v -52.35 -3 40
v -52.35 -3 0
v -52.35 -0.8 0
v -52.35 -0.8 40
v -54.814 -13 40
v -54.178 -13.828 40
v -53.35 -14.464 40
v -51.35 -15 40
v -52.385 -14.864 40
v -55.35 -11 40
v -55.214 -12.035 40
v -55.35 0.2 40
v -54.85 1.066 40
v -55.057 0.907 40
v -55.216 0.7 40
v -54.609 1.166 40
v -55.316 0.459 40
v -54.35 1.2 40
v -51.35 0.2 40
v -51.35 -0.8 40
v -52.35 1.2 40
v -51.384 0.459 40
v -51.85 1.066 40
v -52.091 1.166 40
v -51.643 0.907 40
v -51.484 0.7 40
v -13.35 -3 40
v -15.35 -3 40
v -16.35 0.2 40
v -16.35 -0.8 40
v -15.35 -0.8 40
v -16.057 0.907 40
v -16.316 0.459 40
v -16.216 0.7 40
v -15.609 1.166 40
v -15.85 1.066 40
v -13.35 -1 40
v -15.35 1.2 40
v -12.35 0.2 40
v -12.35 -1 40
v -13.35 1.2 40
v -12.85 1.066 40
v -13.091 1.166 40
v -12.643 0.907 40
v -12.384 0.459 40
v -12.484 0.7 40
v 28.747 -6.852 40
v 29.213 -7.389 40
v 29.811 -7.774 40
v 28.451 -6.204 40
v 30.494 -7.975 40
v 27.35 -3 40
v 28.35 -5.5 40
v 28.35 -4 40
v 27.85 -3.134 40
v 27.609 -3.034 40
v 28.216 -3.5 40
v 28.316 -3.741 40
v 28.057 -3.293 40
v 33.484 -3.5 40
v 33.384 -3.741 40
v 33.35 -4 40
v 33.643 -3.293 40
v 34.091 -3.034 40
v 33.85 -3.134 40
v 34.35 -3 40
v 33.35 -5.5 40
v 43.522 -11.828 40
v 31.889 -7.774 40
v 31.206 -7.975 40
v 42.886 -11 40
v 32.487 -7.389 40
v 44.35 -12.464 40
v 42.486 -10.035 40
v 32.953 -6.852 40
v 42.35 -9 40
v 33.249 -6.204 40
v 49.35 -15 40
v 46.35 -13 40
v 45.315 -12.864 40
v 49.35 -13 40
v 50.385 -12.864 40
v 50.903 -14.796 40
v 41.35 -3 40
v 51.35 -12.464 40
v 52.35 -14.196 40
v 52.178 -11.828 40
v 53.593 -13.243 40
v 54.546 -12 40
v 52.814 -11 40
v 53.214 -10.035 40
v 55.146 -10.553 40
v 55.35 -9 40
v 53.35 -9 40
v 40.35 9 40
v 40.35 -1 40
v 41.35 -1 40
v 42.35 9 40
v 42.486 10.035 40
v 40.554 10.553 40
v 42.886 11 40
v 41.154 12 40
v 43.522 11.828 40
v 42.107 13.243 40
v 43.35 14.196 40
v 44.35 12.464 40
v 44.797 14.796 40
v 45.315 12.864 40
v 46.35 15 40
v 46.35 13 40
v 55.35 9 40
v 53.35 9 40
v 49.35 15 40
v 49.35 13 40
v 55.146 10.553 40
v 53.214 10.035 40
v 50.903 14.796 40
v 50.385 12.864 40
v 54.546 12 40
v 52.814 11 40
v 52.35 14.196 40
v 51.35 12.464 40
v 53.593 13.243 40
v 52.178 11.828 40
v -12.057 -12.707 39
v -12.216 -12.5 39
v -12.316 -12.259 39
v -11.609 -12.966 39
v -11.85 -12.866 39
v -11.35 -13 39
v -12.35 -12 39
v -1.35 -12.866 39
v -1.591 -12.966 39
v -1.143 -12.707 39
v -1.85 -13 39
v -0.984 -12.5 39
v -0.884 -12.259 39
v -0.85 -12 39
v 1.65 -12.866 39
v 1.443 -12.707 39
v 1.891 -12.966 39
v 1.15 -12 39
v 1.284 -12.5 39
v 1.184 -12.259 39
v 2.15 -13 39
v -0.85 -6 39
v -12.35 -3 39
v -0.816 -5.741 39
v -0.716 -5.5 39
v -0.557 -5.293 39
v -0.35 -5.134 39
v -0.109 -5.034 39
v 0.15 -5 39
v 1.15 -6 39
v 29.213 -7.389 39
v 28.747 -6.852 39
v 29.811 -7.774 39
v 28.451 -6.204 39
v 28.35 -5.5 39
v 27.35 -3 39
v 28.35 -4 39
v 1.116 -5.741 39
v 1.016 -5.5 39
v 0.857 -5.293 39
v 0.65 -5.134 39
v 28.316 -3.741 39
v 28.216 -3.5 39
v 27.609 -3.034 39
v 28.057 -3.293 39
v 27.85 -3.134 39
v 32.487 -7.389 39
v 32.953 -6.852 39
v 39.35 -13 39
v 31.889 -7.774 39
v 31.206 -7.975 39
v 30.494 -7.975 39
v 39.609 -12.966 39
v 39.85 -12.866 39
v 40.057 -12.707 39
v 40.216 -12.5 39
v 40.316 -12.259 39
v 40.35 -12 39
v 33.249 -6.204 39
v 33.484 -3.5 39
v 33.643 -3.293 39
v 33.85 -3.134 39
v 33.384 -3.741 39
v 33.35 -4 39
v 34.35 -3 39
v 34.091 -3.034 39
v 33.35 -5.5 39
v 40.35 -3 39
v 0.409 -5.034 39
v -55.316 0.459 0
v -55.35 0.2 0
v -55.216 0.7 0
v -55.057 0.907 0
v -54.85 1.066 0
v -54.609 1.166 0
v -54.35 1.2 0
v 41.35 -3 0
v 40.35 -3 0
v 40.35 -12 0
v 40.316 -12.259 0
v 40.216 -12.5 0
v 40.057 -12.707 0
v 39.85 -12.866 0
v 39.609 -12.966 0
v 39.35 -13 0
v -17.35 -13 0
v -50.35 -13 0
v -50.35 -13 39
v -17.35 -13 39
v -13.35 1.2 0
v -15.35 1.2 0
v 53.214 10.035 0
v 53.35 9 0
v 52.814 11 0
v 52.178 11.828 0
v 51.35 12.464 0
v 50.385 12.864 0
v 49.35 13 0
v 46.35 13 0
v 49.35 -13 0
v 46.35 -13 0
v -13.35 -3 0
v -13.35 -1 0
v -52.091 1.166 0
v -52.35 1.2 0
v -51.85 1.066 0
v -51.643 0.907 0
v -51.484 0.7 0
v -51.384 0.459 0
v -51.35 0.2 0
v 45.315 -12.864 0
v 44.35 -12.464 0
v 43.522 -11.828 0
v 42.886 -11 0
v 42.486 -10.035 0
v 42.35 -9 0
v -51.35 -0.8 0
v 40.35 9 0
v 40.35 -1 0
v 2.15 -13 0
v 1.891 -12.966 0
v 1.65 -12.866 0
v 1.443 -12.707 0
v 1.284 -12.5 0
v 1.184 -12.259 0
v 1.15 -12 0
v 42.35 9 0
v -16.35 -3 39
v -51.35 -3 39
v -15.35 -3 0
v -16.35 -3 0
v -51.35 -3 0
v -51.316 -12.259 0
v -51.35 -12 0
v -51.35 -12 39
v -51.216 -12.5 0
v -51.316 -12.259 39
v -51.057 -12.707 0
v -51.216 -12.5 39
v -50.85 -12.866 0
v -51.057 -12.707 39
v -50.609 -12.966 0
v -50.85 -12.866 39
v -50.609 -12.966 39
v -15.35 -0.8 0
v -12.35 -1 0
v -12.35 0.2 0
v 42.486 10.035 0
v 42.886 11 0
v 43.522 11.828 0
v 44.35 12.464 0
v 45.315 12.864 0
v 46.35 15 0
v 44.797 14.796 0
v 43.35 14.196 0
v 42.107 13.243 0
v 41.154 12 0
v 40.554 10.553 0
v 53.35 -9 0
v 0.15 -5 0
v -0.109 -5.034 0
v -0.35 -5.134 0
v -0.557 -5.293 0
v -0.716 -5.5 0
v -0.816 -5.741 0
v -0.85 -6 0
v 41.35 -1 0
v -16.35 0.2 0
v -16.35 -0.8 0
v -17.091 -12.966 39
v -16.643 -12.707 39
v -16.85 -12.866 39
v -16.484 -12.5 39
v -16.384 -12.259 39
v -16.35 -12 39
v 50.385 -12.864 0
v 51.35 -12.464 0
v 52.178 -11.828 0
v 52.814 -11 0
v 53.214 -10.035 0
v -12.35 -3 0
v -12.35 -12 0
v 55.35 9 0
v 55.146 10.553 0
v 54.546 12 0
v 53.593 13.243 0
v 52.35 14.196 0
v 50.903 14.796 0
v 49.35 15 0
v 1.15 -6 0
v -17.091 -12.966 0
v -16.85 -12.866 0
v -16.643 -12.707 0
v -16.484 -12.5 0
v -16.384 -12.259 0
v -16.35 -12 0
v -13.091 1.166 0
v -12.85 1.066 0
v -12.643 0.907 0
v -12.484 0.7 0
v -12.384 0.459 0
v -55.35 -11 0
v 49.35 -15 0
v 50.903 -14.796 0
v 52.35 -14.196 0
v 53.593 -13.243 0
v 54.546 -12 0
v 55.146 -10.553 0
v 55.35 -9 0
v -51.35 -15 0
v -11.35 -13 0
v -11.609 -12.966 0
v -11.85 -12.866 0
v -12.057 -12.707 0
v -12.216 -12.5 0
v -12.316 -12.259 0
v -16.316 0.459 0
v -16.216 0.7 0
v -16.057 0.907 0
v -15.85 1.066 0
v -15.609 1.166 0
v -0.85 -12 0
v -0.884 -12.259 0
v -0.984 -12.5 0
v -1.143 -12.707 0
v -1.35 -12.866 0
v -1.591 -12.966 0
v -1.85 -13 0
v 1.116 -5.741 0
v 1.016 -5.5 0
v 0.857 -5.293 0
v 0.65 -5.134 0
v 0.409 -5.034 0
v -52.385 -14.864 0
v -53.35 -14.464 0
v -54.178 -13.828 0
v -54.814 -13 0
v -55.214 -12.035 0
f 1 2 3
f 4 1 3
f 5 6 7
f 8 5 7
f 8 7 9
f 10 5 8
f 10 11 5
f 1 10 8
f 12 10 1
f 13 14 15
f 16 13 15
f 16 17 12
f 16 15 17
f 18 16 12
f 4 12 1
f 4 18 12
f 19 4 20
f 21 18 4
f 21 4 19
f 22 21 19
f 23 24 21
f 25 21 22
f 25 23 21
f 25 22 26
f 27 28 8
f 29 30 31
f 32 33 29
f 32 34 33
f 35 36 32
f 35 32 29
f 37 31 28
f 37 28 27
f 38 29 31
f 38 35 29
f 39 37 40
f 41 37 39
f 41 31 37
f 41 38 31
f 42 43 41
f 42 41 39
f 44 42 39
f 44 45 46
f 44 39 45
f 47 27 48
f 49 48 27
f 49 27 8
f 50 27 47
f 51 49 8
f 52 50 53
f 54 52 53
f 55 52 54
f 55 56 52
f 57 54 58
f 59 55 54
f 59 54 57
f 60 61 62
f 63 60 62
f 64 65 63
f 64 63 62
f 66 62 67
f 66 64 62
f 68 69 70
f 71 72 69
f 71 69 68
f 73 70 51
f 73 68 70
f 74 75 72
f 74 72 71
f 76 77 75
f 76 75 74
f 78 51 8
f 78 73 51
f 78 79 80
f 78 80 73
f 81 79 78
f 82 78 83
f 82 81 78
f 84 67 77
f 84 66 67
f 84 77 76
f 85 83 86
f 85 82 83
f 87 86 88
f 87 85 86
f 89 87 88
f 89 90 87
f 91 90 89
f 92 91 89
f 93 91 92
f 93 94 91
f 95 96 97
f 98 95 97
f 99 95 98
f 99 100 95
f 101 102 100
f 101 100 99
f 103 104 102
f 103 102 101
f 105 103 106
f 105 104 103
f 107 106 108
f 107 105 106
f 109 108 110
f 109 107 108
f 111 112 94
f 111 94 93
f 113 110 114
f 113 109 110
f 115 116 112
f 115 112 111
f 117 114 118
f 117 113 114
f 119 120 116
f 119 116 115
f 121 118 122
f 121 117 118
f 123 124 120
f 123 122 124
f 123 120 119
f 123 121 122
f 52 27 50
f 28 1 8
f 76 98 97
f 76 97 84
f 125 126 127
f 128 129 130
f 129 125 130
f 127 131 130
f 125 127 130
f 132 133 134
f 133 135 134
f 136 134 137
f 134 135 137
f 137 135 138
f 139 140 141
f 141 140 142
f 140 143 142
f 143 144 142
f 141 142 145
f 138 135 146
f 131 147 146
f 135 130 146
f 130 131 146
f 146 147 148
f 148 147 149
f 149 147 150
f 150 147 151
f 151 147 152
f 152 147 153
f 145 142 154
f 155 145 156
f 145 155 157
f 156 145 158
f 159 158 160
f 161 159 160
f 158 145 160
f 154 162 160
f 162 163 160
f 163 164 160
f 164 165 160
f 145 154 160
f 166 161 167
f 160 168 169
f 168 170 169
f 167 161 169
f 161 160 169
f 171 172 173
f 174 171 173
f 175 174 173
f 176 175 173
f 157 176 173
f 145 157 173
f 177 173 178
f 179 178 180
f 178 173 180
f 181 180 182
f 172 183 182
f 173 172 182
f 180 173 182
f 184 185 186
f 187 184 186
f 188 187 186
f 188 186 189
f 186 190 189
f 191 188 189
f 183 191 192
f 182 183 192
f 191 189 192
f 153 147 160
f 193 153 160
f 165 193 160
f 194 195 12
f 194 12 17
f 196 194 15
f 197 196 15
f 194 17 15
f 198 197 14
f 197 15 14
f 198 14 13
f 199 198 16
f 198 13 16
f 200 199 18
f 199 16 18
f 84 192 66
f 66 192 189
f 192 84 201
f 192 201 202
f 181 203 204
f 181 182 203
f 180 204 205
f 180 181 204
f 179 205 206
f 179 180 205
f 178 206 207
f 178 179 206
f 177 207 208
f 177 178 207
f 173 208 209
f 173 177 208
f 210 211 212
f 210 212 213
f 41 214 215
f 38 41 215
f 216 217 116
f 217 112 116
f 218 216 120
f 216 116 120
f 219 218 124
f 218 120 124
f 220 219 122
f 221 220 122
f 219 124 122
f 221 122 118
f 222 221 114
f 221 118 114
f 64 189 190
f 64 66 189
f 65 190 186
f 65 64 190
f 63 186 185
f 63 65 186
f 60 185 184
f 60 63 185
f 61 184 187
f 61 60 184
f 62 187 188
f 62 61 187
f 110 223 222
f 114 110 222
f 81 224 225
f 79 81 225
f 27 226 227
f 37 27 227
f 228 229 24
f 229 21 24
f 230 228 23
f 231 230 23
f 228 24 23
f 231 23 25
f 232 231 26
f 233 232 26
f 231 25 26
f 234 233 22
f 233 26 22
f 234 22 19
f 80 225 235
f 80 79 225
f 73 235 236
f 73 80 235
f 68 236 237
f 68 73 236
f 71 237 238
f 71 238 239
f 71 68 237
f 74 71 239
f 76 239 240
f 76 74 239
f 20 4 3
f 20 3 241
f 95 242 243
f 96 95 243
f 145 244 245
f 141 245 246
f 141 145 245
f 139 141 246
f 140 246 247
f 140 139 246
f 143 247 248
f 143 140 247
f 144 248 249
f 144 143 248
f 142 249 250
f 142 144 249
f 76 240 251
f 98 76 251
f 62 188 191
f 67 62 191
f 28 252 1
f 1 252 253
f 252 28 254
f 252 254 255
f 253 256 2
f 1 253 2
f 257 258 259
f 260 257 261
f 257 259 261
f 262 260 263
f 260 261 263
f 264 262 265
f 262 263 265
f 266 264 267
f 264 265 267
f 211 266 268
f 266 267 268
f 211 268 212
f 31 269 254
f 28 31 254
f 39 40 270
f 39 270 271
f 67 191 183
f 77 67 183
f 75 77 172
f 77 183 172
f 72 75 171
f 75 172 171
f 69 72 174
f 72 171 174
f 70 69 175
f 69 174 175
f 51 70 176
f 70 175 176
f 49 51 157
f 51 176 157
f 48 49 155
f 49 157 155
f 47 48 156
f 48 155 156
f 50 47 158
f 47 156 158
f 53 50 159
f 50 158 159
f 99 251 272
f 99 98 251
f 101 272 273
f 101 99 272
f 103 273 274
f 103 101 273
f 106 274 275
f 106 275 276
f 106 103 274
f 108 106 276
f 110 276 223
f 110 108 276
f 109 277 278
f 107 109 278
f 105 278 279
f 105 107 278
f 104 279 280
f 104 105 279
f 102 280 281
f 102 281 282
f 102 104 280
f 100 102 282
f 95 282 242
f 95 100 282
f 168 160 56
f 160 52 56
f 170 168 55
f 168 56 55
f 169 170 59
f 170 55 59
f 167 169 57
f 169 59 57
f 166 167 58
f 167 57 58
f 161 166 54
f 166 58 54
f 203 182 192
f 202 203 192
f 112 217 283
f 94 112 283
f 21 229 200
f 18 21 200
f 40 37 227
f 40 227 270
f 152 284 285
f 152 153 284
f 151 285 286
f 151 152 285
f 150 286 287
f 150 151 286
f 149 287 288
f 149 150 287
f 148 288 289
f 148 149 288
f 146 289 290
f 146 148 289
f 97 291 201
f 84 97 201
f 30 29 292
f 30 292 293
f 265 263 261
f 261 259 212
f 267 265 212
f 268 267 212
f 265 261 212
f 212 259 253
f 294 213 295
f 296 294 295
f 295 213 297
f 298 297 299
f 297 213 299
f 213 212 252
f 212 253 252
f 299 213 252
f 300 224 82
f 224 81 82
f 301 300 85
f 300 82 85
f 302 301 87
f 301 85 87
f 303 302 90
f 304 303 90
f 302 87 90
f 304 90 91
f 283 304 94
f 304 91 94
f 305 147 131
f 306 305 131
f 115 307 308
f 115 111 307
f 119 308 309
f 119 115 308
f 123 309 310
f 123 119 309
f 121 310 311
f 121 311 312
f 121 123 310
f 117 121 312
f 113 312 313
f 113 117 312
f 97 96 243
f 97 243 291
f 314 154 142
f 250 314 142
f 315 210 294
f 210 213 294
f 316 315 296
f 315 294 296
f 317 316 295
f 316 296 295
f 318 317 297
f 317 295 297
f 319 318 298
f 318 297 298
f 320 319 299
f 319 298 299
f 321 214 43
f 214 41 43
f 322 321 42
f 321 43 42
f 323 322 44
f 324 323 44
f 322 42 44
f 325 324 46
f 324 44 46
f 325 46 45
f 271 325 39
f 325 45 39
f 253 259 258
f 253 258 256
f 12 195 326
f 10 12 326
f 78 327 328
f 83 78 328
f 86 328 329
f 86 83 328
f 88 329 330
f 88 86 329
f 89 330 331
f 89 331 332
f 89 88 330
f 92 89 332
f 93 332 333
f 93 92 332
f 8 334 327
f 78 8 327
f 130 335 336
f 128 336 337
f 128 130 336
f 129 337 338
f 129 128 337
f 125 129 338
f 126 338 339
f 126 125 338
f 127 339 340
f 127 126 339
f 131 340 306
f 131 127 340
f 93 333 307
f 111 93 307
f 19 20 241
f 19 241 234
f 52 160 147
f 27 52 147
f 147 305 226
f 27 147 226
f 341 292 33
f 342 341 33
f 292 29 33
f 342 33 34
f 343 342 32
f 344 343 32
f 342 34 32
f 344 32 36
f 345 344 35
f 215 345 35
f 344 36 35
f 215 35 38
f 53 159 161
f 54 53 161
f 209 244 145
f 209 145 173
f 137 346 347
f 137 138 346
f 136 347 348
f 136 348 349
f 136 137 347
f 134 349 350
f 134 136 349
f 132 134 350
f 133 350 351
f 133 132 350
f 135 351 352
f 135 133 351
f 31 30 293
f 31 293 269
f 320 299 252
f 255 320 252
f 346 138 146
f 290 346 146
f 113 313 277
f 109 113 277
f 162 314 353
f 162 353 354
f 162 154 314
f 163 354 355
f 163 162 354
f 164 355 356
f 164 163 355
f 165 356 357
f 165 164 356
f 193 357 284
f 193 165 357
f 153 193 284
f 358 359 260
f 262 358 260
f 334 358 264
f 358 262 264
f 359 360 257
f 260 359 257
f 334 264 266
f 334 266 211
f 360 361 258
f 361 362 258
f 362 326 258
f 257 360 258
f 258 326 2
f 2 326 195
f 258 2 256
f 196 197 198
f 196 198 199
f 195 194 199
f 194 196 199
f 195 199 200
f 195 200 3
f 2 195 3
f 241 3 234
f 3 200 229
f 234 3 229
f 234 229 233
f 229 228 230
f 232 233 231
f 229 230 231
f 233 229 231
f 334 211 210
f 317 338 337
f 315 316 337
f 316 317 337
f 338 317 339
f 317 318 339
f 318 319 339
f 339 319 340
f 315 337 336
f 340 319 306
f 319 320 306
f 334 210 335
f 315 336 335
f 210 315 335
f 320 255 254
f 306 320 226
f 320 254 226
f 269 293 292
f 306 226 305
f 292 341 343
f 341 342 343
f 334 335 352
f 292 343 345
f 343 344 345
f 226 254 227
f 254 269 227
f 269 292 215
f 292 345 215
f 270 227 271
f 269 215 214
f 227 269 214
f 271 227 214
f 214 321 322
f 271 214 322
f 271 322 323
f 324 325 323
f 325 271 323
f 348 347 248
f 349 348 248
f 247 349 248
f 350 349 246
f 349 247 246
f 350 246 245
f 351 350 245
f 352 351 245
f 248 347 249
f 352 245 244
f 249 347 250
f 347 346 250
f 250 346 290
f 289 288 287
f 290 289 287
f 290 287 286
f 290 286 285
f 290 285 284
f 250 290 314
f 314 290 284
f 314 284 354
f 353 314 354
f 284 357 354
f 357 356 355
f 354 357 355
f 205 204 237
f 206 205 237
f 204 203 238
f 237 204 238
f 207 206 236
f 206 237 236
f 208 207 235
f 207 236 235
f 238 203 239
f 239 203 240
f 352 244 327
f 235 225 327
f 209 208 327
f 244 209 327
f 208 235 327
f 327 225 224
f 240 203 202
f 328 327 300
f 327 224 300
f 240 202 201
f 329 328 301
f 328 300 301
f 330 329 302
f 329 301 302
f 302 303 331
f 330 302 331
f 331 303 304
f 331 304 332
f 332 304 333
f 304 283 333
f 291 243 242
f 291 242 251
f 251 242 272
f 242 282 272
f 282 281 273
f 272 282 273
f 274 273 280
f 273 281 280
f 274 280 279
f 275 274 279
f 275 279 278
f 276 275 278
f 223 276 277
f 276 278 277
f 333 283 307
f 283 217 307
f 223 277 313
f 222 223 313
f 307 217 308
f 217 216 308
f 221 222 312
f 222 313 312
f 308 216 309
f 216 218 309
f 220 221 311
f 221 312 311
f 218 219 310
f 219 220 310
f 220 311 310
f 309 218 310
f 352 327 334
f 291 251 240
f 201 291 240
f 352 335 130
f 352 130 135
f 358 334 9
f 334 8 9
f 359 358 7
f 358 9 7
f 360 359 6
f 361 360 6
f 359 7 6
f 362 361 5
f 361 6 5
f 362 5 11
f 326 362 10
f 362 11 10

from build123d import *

# Parameters (mm, degrees)
F0_W     = 2
F0_H     = 8
F0_W_2   = 35
F0_H_2   = 10
F1_DEPTH = 40
F2_DEPTH = 39
F3_R     = 4
F4_R     = 0.99999
F5_R     = 6


# Not quite as in the source:
# - a fillet or chamfer is up to 0.001 mm smaller than in the source, because OpenCascade refuses the exact size


with BuildPart() as f1:
    # F0 (on Top) → F1 (new body)
    with BuildSketch(Plane.XY):
        Polygon((40.35, -15), (55.35, -15), (55.35, 15), (40.35, 15), (40.35, 1.2), (40.35, -1), (41.35, -1), (41.35, -3), (40.35, -3), (40.35, -13), align=None)
        Polygon((42.35, -13), (42.35, 1.2), (42.35, 13), (53.35, 13), (53.35, -13), align=None, mode=Mode.SUBTRACT)
        Polygon((-55.35, -15), (40.35, -15), (40.35, -13), (1.15, -13), (-0.85, -13), (-12.35, -13), (-16.35, -13), (-51.35, -13), (-55.35, -13), align=None)
        Polygon((-12.35, -1), (-12.35, 1.2), (-16.35, 1.2), (-16.35, -0.8), (-15.35, -0.8), (-15.35, -3), (-16.35, -3), (-16.35, -13), (-12.35, -13), (-12.35, -3), (-13.35, -3), (-13.35, -1), align=None)
        Polygon((-55.35, 1.2), (-55.35, -13), (-51.35, -13), (-51.35, -3), (-52.35, -3), (-52.35, -0.8), (-51.35, -0.8), (-51.35, 1.2), align=None)
        with Locations((0.15, -9)):
            Rectangle(F0_W, F0_H)
        with Locations((-33.85, -8)):
            Rectangle(F0_W_2, F0_H_2)
        with BuildLine():
            Line((1.15, -13), (40.35, -13))
            Line((40.35, -13), (40.35, -3))
            Line((40.35, -3), (33.35, -3))
            Line((33.35, -3), (33.35, -5.5))
            ThreePointArc((33.35, -5.5), (30.85, -8), (28.35, -5.5))
            Line((28.35, -5.5), (28.35, -3))
            Line((28.35, -3), (-12.35, -3))
            Line((-12.35, -3), (-12.35, -13))
            Line((-12.35, -13), (-0.85, -13))
            Line((-0.85, -13), (-0.85, -5))
            Line((-0.85, -5), (1.15, -5))
            Line((1.15, -5), (1.15, -13))
        make_face()
    extrude(amount=F1_DEPTH)

    # F0 (on Top) → F2 (cut)
    with BuildSketch(Plane.XY):
        with Locations((-33.85, -8)):
            Rectangle(F0_W_2, F0_H_2)
        with BuildLine():
            Line((1.15, -13), (40.35, -13))
            Line((40.35, -13), (40.35, -3))
            Line((40.35, -3), (33.35, -3))
            Line((33.35, -3), (33.35, -5.5))
            ThreePointArc((33.35, -5.5), (30.85, -8), (28.35, -5.5))
            Line((28.35, -5.5), (28.35, -3))
            Line((28.35, -3), (-12.35, -3))
            Line((-12.35, -3), (-12.35, -13))
            Line((-12.35, -13), (-0.85, -13))
            Line((-0.85, -13), (-0.85, -5))
            Line((-0.85, -5), (1.15, -5))
            Line((1.15, -5), (1.15, -13))
        make_face()
    extrude(amount=F2_DEPTH, mode=Mode.SUBTRACT)

    # F3
    f3_edges = [f1.edges().sort_by_distance(p)[0] for p in [
        (42.35, -13, 20),
        (53.35, -13, 20),
        (53.35, 13, 20),
        (42.35, 13, 20),
        (-55.35, -15, 20),
    ]]
    fillet(f3_edges, radius=F3_R)

    # F4 (radius 1 in the source; OpenCascade refuses exactly that, so slightly less here)
    f4_edges = [f1.edges().sort_by_distance(p)[0] for p in [
        (40.35, -13, 19.5),
        (-0.85, -13, 19.5),
        (-0.85, -5, 19.5),
        (-16.35, -13, 19.5),
        (-16.35, 1.2, 20),
        (-12.35, 1.2, 20),
        (-55.35, 1.2, 20),
        (-51.35, 1.2, 20),
        (-51.35, -13, 19.5),
        (1.15, -5, 19.5),
        (1.15, -13, 19.5),
        (-12.35, -13, 19.5),
        (33.35, -3, 39.5),
        (28.35, -3, 39.5),
    ]]
    fillet(f4_edges, radius=F4_R)

    # F5
    f5_edges = [f1.edges().sort_by_distance(p)[0] for p in [
        (40.35, 15, 20),
        (55.35, 15, 20),
        (55.35, -15, 20),
    ]]
    fillet(f5_edges, radius=F5_R)


solid = f1.part
